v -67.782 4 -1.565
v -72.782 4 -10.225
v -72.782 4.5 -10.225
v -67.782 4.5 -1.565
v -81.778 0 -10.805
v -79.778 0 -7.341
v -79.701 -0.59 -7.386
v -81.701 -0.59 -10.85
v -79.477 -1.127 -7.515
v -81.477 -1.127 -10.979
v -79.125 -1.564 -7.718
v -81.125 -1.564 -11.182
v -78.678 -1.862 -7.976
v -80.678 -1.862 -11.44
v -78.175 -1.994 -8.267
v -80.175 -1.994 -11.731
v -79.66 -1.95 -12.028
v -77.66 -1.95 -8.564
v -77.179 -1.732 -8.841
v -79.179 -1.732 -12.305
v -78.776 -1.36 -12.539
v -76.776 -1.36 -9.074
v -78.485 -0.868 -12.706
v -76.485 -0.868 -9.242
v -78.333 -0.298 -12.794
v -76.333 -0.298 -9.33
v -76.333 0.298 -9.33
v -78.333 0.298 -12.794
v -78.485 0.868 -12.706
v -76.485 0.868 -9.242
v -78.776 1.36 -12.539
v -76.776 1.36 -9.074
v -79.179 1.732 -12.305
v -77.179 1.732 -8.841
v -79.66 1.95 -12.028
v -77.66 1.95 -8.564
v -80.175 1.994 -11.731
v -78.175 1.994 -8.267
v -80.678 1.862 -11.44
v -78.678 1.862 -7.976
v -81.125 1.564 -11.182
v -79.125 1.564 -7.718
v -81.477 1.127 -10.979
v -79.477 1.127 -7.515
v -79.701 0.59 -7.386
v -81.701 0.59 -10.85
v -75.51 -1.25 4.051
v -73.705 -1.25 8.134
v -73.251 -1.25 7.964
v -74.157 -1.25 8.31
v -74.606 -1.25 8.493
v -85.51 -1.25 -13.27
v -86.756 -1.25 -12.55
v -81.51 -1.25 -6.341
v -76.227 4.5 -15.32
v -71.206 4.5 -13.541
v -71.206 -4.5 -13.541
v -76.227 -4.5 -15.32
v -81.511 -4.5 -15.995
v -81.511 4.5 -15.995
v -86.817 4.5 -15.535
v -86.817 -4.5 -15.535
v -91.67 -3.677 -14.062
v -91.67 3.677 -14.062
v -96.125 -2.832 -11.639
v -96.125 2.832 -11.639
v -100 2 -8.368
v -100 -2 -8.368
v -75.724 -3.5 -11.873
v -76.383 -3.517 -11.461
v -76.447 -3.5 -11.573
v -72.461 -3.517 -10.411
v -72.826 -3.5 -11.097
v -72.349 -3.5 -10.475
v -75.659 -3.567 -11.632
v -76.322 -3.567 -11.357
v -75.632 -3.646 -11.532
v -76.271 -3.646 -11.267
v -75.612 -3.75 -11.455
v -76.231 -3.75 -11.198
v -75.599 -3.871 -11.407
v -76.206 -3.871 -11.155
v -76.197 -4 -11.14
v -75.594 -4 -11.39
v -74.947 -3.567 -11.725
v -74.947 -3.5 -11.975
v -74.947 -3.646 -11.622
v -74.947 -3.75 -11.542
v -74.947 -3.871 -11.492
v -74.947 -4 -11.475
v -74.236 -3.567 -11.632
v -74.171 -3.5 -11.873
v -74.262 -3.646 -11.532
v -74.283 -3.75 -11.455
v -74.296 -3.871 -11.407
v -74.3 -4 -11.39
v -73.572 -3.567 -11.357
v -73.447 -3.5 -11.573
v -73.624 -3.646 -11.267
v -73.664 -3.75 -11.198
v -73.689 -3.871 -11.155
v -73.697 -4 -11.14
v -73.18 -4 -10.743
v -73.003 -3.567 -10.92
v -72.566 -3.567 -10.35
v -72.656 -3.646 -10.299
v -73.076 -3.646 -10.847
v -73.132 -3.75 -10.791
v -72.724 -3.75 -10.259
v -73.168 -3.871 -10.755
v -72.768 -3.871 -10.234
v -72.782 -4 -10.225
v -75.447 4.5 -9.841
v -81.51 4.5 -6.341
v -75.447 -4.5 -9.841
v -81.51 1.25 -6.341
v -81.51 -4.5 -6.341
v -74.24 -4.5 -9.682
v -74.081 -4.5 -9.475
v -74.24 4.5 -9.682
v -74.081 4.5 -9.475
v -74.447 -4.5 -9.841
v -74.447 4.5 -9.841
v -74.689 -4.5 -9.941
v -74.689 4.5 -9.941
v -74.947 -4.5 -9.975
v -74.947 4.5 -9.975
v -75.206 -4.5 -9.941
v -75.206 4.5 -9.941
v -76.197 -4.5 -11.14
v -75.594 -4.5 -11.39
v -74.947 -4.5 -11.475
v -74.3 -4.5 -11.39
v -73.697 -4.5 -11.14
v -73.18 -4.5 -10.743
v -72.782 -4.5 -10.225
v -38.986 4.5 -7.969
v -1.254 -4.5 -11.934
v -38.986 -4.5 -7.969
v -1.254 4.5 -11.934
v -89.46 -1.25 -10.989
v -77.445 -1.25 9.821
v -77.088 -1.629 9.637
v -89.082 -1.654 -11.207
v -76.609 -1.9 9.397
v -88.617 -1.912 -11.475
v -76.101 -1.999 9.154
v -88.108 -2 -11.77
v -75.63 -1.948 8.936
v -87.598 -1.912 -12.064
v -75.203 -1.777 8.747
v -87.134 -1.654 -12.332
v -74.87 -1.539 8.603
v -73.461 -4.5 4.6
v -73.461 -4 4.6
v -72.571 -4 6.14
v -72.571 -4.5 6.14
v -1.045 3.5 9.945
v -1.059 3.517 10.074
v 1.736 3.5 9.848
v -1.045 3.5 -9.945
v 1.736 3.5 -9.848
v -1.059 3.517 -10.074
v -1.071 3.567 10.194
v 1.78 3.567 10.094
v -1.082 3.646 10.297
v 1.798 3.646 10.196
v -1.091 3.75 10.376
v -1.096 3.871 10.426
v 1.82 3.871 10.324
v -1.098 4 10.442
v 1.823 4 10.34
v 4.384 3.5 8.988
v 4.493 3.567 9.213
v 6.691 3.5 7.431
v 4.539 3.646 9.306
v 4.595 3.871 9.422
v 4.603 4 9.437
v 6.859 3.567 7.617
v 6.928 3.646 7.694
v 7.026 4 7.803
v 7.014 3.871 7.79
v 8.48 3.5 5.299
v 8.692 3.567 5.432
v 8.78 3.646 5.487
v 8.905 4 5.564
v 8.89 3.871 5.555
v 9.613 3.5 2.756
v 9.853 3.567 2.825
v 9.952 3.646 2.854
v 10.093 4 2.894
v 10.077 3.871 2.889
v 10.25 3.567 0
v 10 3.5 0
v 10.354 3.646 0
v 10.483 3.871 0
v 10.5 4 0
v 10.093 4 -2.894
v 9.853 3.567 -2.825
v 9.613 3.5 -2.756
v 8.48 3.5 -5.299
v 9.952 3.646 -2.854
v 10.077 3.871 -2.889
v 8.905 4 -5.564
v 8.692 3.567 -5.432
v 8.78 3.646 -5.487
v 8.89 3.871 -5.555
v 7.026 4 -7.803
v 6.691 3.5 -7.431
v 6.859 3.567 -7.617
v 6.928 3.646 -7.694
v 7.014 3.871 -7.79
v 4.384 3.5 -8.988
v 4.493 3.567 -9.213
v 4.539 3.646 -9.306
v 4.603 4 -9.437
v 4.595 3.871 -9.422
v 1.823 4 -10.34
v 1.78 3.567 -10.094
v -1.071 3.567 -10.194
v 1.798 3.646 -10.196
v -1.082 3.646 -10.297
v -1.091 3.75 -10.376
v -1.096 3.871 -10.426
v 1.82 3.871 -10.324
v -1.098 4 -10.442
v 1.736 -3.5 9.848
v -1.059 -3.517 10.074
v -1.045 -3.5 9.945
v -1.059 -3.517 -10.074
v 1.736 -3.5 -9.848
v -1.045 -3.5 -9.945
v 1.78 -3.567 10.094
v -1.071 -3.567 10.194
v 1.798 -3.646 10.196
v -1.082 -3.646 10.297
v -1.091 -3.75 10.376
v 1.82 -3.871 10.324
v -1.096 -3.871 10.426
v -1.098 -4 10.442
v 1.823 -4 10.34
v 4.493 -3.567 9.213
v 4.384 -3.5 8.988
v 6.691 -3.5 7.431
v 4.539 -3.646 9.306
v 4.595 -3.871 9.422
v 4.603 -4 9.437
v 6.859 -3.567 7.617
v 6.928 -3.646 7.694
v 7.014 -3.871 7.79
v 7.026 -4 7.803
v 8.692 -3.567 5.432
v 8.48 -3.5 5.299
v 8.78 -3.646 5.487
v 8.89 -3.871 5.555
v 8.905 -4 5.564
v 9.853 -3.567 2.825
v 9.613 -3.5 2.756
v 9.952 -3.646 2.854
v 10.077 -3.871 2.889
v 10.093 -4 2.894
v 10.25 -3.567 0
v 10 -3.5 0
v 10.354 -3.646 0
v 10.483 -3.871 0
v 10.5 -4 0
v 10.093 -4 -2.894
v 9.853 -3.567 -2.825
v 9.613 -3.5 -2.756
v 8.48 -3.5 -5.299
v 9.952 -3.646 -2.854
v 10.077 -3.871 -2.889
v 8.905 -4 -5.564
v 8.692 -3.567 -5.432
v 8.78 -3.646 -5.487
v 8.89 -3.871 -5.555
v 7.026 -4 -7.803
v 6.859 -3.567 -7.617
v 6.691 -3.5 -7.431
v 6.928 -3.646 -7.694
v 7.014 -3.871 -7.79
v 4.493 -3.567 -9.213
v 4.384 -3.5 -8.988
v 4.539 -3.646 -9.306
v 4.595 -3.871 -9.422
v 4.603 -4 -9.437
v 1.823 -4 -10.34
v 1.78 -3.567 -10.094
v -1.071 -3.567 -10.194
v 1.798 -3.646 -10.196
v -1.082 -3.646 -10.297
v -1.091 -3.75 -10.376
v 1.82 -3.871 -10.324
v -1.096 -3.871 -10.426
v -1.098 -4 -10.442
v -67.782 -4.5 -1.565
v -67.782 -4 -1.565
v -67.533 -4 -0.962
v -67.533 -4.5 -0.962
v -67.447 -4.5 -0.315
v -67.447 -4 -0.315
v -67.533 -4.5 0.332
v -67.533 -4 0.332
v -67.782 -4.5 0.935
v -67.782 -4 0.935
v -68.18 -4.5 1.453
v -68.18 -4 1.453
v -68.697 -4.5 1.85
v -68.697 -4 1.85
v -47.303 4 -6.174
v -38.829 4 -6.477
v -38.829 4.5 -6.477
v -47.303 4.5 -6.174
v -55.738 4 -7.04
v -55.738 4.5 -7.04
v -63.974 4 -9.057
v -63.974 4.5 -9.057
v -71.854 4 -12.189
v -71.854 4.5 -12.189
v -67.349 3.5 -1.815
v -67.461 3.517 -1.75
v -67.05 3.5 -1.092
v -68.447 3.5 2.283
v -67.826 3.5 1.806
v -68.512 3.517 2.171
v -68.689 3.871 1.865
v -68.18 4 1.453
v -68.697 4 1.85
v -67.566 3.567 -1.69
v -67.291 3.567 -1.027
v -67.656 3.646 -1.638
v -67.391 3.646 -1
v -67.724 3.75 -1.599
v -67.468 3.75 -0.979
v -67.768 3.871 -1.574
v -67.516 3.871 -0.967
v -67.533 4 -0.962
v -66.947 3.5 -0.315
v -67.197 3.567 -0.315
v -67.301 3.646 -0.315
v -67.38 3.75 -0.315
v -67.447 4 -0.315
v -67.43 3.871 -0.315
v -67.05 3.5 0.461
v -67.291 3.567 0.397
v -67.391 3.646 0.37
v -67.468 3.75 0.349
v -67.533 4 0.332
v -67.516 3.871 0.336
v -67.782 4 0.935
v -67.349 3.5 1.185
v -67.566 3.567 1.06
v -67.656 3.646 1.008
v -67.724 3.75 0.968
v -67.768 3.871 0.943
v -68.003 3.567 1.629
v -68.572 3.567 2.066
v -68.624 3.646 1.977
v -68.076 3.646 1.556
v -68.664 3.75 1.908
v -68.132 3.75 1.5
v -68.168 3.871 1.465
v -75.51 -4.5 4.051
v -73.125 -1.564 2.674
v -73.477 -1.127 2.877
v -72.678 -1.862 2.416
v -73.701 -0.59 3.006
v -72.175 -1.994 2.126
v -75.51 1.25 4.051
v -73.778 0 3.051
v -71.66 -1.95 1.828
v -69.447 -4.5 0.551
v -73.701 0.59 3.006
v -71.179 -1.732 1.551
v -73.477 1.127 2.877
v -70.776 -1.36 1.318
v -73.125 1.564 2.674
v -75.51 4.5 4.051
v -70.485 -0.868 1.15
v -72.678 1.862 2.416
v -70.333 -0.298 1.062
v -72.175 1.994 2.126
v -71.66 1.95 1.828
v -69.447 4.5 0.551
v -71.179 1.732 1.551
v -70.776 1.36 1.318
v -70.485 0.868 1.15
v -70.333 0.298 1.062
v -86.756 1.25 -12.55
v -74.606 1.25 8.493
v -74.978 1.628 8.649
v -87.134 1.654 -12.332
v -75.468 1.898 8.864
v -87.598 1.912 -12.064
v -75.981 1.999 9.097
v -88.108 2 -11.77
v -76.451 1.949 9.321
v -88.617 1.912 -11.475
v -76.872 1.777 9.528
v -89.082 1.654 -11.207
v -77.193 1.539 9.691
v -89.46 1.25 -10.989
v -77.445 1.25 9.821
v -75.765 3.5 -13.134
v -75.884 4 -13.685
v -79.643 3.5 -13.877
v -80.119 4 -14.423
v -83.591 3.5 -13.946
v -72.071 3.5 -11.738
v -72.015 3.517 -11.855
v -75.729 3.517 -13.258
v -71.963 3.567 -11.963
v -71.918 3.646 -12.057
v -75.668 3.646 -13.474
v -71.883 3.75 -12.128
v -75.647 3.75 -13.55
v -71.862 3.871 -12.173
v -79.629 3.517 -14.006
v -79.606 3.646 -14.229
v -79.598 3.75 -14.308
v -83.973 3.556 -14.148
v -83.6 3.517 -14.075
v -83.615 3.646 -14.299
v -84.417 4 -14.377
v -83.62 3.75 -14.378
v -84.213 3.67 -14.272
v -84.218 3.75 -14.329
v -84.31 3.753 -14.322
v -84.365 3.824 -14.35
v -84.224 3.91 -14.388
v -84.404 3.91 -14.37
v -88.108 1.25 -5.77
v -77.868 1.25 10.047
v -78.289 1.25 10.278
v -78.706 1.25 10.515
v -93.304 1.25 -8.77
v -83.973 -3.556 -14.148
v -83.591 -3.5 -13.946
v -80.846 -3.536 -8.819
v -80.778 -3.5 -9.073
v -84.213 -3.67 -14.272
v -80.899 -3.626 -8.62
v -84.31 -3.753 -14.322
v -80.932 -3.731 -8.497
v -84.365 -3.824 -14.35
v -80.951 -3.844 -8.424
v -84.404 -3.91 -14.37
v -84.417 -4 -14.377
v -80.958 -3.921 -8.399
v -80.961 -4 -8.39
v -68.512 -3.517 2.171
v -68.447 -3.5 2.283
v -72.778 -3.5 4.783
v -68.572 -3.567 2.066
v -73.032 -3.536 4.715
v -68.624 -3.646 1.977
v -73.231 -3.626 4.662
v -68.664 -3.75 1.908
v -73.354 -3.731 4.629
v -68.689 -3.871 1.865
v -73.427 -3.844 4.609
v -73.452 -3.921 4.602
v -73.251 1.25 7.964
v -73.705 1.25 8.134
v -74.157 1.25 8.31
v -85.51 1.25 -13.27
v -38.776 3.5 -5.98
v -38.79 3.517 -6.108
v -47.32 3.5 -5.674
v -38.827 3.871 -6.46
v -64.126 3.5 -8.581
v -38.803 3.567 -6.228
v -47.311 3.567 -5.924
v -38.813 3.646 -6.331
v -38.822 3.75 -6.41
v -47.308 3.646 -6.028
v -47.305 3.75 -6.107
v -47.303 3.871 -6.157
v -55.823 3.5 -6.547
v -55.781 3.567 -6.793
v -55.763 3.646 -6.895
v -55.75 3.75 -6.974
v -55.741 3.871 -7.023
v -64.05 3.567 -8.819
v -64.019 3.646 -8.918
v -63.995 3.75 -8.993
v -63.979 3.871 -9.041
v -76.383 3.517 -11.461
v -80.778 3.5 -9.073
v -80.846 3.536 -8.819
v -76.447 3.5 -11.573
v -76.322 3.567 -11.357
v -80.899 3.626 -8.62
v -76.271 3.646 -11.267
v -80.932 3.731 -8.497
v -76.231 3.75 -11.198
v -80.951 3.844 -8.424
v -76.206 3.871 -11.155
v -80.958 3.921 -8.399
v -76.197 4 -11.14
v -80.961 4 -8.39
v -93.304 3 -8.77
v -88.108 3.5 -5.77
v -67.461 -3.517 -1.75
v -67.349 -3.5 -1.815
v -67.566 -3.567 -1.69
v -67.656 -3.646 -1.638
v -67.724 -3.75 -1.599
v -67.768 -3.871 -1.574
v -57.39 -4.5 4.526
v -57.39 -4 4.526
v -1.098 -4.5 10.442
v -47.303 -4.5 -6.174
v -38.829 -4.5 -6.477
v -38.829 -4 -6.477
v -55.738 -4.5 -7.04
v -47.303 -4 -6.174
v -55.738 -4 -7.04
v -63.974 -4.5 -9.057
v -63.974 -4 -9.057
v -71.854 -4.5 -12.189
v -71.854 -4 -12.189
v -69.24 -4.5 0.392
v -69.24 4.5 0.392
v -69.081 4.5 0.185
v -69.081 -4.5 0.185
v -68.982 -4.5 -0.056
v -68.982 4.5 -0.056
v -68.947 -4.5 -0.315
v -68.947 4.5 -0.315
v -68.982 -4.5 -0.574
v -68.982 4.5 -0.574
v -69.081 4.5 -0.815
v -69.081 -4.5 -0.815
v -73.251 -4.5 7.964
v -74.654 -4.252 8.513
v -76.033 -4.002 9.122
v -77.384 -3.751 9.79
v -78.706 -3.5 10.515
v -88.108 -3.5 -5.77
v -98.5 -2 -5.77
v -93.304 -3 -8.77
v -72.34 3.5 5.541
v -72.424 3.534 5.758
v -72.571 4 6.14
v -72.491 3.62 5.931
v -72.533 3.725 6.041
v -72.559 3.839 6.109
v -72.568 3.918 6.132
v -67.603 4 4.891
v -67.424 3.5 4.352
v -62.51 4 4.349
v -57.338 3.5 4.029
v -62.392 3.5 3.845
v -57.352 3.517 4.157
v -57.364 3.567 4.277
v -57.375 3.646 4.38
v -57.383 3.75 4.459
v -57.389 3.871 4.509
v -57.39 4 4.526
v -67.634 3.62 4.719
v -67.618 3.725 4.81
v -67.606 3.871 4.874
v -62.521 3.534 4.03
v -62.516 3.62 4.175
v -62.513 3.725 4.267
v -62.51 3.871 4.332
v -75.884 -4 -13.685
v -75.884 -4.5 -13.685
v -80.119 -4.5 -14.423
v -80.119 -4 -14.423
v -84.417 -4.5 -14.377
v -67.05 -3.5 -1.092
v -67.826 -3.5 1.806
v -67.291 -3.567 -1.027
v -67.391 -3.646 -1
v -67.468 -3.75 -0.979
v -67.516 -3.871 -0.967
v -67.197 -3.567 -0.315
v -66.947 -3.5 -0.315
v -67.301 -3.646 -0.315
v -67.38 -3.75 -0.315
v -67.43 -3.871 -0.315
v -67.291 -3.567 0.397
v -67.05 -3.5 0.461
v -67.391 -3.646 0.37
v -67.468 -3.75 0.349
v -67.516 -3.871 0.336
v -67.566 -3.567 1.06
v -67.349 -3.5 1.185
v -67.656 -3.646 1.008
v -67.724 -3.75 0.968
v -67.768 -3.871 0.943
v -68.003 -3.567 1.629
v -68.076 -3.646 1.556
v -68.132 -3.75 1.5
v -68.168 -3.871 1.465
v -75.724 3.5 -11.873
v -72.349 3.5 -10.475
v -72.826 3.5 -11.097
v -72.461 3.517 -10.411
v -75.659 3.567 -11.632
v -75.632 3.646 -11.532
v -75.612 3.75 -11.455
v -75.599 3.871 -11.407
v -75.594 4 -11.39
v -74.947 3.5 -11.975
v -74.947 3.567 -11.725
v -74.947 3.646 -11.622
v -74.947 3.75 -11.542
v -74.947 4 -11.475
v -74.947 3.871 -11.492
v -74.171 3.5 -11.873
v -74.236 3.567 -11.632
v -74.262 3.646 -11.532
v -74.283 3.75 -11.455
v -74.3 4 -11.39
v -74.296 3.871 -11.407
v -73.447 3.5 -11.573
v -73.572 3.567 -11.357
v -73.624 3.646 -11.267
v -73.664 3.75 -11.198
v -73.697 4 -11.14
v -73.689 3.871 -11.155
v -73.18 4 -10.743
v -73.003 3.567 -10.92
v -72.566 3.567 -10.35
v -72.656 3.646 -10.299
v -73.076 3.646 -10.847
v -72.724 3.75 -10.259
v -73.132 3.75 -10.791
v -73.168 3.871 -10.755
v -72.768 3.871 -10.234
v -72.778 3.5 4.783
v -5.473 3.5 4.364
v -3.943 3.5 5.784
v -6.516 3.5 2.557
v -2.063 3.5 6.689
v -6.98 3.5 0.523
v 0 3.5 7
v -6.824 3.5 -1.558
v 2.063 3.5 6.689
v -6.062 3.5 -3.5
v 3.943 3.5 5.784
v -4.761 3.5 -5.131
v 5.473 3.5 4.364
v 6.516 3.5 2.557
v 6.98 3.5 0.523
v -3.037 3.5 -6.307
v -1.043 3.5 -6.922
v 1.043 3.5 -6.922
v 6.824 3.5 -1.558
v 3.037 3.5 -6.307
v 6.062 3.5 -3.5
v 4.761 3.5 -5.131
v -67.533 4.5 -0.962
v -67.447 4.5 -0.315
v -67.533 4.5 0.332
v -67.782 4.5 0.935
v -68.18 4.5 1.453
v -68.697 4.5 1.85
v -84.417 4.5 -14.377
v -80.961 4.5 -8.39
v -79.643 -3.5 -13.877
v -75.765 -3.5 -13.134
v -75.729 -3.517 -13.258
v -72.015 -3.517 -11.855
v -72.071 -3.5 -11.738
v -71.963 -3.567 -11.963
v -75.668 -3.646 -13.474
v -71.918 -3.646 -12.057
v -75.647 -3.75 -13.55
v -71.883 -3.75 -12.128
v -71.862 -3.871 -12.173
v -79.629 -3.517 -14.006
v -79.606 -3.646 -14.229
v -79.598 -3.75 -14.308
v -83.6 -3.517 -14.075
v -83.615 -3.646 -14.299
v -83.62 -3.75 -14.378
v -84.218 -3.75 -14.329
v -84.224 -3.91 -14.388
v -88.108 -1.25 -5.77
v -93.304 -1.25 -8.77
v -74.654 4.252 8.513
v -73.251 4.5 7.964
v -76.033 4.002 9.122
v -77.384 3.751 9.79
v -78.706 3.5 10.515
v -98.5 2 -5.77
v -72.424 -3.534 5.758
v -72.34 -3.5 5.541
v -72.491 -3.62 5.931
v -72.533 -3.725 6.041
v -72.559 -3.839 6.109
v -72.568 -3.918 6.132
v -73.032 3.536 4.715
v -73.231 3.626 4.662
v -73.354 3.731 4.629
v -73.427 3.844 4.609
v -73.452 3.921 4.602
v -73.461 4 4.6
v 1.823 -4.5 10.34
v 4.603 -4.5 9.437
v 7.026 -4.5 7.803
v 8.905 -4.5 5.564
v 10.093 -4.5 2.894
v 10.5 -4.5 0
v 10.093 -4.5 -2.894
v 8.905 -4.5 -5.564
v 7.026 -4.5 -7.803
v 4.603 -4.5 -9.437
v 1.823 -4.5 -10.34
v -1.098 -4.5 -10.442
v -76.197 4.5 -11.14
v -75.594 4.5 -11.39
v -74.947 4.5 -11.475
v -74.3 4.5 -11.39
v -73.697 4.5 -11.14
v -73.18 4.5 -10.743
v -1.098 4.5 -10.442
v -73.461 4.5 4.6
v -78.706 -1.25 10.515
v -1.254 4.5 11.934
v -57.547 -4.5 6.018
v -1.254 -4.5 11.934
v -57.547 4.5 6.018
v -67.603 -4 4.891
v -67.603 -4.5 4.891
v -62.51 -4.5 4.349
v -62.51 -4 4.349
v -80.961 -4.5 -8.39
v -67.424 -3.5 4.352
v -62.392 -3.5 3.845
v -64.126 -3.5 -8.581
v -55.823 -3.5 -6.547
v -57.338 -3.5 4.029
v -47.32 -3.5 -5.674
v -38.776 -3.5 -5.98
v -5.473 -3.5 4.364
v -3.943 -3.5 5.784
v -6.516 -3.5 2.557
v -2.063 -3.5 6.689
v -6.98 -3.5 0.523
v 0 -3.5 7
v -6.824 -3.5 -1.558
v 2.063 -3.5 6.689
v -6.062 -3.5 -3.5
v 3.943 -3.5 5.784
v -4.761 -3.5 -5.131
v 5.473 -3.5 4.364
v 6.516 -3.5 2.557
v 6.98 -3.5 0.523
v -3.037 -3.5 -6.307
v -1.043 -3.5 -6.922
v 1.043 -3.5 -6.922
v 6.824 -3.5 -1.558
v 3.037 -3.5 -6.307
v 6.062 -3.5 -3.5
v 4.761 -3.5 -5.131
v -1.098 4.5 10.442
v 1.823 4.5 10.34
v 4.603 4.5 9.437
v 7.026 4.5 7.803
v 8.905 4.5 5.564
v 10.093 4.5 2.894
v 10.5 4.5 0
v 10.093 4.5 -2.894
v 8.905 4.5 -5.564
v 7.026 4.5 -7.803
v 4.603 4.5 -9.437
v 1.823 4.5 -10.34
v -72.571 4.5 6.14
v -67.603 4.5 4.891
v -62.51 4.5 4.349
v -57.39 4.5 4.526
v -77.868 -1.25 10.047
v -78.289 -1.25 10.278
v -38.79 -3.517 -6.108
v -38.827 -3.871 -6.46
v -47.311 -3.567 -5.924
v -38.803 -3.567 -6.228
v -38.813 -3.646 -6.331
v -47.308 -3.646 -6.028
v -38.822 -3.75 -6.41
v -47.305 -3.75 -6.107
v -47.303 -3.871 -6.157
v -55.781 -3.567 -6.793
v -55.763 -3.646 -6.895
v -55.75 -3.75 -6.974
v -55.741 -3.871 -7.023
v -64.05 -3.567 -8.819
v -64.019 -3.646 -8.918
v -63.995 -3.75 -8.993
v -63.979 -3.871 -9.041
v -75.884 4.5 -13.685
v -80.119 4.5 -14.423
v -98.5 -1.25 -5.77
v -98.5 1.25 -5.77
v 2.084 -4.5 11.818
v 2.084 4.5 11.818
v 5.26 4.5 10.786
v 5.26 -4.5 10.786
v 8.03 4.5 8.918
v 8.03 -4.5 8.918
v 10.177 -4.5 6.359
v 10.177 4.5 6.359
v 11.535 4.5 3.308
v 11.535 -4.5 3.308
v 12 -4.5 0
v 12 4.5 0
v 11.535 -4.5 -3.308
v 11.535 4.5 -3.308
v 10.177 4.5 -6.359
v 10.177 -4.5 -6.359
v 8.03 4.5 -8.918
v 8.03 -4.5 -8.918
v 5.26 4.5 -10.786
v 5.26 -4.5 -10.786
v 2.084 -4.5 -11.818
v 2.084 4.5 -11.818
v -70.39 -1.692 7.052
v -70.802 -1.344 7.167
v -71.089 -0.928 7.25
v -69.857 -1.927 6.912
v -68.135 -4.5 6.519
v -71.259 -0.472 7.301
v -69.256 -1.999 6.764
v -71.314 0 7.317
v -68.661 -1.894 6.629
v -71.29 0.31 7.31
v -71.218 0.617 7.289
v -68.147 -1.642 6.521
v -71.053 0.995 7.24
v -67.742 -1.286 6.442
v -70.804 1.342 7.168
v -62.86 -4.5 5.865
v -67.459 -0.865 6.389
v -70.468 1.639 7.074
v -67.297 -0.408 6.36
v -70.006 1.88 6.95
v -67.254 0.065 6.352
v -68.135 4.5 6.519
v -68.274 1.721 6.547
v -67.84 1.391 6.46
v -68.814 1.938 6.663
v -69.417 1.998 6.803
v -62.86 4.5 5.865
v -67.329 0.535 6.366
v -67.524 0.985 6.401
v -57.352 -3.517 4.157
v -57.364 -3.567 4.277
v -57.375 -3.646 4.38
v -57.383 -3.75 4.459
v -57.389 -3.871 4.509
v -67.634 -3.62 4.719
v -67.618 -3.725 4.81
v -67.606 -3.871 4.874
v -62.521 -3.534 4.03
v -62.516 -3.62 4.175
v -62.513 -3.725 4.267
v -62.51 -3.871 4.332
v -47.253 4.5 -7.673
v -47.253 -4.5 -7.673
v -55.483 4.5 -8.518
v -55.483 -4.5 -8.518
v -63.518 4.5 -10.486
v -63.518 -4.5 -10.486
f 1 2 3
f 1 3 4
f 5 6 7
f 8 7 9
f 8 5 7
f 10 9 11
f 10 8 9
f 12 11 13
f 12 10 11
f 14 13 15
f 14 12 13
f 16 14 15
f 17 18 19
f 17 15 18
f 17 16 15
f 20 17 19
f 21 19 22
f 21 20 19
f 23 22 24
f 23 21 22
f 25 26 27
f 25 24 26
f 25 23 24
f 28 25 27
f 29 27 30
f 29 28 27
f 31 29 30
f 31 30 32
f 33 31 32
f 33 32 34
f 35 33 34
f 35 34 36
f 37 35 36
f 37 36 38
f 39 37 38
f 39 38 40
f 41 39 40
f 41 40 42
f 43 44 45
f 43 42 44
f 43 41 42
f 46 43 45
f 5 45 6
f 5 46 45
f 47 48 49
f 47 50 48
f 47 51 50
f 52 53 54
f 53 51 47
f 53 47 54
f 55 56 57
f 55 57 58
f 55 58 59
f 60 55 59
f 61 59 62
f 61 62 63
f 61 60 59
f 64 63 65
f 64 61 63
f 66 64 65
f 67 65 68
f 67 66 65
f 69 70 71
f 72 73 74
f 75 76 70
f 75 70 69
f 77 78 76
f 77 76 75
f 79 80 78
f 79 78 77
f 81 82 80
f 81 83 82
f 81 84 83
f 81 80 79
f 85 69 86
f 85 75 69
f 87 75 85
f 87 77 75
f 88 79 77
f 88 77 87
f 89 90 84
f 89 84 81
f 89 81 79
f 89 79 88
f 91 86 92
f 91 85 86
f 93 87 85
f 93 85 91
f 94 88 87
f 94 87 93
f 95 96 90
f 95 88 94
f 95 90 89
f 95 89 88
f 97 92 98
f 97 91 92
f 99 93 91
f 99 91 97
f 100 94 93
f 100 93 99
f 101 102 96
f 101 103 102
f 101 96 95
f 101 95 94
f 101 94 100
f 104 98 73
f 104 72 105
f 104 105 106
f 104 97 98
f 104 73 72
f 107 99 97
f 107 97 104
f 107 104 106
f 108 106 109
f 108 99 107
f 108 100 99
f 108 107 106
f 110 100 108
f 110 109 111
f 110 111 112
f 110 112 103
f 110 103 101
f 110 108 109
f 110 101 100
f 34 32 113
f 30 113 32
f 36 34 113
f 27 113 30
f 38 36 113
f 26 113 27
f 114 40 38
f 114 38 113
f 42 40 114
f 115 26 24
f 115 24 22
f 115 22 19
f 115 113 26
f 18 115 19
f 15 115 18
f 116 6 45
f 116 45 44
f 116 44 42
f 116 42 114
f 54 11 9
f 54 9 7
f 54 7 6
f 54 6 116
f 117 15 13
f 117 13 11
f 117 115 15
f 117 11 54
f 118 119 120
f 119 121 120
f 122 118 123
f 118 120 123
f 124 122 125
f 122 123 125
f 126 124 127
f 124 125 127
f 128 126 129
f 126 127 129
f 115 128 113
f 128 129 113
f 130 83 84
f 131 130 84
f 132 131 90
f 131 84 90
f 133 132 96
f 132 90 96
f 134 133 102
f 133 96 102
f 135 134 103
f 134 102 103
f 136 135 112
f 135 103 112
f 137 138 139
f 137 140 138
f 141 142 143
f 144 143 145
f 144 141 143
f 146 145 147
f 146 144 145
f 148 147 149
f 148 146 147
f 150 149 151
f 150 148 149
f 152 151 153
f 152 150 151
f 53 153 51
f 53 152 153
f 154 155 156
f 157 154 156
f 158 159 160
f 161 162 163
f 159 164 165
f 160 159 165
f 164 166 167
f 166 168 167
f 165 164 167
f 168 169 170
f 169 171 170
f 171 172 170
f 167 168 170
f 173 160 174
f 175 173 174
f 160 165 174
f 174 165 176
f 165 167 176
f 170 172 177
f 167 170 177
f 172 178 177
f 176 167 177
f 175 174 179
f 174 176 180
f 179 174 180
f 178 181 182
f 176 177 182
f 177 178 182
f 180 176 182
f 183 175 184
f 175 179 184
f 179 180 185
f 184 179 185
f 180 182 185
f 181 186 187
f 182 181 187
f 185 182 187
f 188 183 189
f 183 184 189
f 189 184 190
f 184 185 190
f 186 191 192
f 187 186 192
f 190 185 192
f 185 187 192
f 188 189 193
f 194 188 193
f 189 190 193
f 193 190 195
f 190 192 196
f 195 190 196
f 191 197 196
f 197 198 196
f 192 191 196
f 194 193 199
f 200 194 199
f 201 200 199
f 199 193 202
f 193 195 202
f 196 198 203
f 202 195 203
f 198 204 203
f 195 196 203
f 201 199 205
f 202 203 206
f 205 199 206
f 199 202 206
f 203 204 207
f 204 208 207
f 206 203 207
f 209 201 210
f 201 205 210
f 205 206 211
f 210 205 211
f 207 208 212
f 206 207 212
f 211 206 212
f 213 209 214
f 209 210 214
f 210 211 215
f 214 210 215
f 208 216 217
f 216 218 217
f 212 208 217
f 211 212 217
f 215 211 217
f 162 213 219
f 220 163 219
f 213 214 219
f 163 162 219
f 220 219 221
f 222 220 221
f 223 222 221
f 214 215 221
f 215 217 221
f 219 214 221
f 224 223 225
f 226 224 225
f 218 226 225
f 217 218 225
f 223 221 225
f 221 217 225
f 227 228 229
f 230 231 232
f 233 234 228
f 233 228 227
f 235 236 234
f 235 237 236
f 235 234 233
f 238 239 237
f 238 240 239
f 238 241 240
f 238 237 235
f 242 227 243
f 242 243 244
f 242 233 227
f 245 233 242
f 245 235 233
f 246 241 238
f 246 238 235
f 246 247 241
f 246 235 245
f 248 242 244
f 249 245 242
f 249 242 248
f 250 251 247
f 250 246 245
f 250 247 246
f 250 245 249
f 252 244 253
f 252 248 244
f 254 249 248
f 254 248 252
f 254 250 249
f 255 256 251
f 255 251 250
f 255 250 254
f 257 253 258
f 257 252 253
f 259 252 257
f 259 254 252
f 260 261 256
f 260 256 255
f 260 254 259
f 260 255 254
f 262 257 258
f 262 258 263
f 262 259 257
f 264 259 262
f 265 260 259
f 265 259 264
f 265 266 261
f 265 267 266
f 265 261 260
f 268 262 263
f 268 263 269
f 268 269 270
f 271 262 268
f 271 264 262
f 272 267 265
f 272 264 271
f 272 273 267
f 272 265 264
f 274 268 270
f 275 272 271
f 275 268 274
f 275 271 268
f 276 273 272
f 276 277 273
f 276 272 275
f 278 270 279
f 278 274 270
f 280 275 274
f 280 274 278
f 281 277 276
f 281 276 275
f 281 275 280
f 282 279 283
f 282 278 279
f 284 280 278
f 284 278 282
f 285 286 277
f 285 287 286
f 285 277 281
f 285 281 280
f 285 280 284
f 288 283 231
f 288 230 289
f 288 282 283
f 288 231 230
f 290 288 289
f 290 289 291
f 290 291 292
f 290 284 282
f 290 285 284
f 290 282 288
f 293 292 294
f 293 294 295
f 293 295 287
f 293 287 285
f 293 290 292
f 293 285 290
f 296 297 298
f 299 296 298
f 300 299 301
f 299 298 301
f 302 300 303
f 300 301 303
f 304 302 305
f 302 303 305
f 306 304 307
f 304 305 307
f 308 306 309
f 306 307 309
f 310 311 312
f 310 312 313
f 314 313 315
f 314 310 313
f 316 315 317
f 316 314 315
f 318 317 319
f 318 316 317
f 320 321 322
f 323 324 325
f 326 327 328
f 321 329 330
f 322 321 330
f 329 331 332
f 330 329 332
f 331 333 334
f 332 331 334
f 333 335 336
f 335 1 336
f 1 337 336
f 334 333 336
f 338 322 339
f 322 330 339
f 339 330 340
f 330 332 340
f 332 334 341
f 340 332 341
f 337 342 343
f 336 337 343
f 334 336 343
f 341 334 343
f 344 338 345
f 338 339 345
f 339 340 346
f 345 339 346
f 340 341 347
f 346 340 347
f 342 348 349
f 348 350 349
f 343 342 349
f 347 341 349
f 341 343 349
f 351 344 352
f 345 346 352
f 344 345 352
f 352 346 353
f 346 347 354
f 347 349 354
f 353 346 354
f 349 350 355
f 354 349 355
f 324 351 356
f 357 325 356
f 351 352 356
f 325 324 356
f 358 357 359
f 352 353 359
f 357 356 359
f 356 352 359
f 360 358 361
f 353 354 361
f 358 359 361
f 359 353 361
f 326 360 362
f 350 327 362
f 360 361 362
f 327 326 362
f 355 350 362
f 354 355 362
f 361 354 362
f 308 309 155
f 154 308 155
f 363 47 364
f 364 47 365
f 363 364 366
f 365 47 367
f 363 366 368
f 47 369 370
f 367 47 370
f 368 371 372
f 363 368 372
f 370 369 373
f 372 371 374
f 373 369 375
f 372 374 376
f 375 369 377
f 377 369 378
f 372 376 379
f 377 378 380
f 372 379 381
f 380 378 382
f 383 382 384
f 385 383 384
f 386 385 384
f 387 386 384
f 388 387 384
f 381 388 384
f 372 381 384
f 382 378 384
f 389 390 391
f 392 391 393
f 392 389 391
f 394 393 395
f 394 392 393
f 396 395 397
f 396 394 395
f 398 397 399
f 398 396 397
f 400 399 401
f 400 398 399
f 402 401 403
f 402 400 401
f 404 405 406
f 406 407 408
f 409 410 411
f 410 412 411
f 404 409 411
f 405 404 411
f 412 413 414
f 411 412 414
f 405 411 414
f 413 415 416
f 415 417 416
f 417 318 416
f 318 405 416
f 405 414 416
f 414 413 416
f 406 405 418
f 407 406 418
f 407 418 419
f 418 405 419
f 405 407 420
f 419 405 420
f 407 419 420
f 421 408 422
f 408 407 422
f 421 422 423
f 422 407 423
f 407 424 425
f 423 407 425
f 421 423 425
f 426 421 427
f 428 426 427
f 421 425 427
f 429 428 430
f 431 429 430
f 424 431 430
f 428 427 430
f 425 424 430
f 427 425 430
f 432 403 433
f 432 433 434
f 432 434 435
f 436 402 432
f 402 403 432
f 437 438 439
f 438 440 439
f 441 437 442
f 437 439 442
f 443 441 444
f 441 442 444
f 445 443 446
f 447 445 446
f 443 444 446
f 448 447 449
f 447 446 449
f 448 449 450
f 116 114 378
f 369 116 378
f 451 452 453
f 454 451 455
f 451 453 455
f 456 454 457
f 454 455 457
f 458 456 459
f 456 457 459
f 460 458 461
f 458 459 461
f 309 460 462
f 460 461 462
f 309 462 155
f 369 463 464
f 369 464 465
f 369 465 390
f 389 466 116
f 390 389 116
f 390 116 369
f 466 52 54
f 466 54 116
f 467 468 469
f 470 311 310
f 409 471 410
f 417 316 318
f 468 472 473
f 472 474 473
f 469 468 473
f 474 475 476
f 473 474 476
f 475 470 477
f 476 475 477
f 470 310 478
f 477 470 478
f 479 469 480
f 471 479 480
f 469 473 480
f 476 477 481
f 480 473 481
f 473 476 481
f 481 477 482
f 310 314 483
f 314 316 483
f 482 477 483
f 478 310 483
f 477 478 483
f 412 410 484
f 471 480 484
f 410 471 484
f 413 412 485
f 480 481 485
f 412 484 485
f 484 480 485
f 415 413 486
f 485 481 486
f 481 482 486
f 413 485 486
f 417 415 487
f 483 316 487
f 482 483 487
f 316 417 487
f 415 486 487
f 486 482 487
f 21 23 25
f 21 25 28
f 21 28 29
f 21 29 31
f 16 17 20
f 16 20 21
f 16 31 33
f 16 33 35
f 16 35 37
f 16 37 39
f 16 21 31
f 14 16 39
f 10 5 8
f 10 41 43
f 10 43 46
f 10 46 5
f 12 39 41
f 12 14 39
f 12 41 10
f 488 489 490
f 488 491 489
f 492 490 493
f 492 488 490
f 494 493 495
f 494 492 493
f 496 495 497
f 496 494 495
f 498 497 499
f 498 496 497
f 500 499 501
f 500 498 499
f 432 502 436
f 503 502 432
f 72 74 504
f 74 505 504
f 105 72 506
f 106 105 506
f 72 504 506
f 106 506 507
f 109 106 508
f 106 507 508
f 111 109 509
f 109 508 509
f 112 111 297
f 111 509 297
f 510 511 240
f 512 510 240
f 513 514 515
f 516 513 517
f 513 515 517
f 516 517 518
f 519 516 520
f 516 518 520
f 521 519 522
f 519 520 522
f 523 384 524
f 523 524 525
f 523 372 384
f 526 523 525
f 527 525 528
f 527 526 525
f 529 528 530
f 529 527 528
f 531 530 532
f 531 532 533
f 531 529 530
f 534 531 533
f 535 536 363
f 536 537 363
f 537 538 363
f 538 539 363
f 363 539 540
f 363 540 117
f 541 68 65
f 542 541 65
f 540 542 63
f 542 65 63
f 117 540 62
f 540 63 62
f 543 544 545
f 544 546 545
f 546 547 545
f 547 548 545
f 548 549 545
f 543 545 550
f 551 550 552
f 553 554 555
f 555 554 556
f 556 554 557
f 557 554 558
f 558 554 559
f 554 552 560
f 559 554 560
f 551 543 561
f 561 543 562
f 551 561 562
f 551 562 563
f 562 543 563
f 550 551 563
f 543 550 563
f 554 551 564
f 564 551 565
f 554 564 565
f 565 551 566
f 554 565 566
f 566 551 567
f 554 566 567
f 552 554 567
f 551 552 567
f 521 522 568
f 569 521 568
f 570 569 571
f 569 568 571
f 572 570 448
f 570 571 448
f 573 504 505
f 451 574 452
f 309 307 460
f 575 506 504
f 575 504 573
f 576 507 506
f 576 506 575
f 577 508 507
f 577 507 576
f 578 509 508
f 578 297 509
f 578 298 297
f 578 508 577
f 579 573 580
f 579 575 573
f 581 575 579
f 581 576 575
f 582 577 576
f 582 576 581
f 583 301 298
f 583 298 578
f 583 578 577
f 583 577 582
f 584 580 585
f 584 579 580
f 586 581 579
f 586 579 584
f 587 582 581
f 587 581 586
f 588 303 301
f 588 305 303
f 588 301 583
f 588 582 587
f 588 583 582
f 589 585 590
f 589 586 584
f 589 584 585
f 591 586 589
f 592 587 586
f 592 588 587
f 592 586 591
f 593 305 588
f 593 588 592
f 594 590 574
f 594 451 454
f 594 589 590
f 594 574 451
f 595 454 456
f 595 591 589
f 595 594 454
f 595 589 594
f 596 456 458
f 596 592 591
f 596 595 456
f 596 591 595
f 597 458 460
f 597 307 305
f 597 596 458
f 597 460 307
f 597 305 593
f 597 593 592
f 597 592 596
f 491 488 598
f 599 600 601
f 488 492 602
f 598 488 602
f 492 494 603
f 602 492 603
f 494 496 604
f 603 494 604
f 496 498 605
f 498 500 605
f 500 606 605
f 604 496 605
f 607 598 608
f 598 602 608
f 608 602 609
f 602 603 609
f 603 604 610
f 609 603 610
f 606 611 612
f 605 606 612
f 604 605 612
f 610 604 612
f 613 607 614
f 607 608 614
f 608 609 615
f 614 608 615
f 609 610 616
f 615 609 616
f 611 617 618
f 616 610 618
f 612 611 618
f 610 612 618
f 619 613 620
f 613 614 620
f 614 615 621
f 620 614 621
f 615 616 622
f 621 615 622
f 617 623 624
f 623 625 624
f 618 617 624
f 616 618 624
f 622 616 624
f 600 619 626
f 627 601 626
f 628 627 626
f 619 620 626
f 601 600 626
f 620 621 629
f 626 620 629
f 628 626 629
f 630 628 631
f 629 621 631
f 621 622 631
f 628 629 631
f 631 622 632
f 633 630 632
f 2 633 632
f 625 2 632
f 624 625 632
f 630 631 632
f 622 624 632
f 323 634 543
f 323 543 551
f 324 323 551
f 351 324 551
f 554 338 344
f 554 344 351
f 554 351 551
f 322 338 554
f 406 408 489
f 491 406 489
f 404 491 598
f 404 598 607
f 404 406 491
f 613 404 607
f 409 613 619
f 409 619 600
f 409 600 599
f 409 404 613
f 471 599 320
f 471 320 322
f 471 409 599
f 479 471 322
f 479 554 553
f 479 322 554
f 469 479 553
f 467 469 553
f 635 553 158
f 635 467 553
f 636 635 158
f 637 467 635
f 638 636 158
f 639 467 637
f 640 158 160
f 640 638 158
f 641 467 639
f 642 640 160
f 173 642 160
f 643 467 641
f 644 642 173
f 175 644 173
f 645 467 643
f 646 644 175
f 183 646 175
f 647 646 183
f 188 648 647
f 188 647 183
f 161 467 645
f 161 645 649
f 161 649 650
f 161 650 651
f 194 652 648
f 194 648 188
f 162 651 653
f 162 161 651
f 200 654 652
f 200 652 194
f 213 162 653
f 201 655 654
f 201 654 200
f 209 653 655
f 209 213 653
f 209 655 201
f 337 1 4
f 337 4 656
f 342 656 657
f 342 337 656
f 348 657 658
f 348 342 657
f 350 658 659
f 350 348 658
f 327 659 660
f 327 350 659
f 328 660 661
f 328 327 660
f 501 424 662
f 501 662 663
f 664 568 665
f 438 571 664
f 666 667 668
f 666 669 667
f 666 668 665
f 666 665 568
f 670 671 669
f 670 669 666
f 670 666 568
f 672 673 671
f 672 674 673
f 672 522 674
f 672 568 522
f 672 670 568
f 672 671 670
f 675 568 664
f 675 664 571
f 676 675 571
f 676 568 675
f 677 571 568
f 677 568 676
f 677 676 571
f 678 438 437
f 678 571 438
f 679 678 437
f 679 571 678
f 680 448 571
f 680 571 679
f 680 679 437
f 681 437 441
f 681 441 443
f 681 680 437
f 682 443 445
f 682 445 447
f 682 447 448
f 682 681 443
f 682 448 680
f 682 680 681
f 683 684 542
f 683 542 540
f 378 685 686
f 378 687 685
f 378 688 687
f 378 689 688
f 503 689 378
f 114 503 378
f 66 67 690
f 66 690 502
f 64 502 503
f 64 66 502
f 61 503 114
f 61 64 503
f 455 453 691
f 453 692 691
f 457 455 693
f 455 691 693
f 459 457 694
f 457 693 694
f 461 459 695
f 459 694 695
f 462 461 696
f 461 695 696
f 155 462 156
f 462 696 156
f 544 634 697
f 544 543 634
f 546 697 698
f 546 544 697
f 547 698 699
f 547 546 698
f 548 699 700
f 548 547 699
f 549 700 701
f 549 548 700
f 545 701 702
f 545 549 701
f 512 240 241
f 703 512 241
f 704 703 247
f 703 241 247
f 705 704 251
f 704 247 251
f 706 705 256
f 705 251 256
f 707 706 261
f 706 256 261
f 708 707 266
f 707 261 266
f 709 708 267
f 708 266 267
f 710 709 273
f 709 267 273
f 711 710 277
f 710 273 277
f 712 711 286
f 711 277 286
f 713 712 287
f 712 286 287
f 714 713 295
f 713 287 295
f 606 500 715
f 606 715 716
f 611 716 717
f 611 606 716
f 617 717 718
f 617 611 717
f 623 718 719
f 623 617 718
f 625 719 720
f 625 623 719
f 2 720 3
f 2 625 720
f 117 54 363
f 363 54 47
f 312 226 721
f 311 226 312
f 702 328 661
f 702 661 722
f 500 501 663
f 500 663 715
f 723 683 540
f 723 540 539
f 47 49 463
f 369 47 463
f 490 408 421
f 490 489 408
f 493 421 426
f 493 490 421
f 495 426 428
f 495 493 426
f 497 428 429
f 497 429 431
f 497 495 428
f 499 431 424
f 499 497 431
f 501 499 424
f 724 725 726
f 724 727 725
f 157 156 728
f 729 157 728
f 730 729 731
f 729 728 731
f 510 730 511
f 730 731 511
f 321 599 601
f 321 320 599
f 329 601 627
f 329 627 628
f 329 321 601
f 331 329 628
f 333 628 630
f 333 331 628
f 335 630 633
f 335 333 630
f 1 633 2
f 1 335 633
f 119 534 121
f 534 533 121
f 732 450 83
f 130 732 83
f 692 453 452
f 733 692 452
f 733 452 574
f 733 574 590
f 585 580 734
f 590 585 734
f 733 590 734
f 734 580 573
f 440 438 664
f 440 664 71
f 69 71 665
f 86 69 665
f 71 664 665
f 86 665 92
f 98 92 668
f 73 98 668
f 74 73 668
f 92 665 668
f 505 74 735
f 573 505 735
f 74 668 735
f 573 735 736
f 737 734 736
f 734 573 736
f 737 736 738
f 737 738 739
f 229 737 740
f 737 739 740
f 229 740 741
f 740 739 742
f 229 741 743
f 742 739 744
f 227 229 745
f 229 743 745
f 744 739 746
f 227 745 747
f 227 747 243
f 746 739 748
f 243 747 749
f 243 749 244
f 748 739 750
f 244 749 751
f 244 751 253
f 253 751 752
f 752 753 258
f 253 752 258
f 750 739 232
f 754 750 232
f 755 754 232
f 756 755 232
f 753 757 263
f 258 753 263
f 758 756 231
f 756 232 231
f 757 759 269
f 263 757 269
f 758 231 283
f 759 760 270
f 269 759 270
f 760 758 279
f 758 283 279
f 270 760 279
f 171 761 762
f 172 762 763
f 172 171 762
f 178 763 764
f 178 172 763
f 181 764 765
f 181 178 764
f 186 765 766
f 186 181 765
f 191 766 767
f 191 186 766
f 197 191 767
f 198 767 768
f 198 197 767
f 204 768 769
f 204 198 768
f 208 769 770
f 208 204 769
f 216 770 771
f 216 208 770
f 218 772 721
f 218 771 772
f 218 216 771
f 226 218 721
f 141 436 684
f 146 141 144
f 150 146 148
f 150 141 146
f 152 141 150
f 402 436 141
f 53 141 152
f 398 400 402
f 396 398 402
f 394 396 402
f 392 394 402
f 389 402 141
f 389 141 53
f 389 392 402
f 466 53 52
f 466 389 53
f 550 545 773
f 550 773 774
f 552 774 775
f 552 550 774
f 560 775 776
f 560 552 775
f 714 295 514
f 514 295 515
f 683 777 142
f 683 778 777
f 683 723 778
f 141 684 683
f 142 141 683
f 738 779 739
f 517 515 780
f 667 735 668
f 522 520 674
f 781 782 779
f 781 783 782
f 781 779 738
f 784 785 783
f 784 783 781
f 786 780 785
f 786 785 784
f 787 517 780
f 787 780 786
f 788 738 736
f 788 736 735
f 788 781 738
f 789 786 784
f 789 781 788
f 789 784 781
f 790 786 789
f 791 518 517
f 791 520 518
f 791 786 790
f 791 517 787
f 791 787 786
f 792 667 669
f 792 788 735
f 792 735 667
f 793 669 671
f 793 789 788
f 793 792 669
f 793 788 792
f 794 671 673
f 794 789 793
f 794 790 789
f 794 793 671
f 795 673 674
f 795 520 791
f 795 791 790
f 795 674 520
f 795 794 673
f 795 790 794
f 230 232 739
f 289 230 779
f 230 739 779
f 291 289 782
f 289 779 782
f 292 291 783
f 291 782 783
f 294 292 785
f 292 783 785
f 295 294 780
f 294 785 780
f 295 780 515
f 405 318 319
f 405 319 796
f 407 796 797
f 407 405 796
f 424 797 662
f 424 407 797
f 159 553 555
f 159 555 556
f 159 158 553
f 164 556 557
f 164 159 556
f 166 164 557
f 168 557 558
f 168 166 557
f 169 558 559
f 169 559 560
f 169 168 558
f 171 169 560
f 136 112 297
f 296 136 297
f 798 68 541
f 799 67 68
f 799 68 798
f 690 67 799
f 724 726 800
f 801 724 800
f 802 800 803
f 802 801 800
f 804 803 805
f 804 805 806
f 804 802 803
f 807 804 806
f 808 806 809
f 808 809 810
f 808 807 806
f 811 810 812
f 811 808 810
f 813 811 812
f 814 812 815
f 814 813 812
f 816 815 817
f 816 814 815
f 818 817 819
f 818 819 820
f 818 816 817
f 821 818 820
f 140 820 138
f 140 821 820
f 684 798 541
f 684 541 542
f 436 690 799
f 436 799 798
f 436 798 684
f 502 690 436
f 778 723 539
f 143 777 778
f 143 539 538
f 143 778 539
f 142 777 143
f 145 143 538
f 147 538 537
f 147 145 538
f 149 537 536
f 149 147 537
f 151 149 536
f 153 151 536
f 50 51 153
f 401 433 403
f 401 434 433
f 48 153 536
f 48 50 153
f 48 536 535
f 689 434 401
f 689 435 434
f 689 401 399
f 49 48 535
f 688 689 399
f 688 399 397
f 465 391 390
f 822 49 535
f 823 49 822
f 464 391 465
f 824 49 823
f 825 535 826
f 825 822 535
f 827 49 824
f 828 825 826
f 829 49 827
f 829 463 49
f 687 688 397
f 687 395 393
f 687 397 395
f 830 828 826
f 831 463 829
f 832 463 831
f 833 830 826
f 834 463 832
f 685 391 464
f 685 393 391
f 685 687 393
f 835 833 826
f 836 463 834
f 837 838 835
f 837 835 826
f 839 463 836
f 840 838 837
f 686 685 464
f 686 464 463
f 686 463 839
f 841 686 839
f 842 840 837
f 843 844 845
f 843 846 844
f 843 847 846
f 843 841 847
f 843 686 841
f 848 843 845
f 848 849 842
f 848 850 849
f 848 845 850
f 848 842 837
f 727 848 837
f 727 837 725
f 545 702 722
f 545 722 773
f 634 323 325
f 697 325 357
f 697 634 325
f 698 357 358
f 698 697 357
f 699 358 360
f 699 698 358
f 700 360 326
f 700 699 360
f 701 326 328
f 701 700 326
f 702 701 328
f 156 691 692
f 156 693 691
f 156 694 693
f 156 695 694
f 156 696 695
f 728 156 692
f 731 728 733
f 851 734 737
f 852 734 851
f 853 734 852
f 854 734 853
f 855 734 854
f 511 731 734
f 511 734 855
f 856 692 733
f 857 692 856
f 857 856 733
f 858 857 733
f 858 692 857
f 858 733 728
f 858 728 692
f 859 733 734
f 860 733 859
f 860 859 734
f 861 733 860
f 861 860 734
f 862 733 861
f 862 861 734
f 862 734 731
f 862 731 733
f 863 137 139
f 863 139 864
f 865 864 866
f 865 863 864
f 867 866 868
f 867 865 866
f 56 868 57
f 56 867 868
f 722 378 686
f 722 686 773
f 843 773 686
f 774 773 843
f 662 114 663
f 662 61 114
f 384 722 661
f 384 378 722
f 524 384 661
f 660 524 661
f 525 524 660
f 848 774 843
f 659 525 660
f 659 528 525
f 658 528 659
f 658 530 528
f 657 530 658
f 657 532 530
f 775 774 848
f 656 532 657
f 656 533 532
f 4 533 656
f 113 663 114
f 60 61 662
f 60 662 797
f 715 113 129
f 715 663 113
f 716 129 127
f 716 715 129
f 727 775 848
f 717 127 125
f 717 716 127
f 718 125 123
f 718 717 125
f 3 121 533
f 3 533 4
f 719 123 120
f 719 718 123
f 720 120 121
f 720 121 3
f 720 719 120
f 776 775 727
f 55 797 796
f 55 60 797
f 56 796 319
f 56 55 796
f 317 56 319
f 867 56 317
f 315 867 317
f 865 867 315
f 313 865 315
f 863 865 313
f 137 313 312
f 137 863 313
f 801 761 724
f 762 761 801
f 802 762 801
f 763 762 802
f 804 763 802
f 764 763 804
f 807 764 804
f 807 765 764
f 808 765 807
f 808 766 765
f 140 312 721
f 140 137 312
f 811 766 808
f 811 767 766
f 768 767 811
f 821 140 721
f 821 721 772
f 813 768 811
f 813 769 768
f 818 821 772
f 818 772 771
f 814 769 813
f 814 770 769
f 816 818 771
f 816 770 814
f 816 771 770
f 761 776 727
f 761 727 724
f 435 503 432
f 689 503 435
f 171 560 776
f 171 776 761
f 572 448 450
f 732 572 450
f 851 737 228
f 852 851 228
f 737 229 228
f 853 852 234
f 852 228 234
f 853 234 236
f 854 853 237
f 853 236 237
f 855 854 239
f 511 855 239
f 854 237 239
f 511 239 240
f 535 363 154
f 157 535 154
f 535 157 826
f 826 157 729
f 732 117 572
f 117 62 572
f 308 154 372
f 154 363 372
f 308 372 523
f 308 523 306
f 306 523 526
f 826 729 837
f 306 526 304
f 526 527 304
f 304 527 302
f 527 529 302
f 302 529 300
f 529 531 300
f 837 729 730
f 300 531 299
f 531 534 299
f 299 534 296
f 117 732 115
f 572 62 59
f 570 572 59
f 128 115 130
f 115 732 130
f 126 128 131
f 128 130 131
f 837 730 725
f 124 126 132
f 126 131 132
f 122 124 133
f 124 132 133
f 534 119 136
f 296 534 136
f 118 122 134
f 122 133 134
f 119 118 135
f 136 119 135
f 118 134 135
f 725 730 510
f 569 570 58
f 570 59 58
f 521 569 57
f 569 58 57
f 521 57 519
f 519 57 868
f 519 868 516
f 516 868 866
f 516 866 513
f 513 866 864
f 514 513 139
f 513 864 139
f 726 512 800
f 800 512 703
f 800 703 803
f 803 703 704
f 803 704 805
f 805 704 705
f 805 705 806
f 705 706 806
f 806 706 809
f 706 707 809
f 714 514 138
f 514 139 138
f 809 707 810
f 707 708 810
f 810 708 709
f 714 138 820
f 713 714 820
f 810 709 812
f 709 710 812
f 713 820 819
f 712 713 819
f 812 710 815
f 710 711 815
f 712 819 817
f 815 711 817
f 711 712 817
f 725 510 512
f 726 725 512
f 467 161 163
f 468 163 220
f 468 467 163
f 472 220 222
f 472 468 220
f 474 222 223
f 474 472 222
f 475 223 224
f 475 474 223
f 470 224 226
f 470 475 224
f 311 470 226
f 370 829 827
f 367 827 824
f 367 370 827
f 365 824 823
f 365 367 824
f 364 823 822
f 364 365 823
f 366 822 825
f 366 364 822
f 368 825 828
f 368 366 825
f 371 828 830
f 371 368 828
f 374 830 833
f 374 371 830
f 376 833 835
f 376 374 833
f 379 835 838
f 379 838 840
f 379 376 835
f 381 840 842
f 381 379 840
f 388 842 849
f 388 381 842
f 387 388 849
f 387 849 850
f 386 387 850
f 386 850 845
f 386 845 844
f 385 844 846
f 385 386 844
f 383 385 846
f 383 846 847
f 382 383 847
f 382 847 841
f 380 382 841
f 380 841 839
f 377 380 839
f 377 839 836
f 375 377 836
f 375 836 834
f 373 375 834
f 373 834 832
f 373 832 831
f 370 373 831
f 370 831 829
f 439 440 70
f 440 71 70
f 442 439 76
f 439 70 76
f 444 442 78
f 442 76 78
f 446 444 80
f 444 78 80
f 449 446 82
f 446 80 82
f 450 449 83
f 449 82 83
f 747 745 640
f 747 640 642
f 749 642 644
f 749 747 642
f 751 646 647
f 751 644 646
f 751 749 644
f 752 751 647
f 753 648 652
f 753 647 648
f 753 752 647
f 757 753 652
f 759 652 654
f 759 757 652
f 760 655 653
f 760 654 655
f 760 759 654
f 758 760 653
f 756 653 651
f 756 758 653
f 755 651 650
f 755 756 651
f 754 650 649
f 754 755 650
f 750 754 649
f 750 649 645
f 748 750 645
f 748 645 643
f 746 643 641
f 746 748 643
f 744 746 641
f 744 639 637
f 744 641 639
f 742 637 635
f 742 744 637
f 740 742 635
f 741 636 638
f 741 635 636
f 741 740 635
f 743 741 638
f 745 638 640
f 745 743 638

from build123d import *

# Parameters (mm, degrees)
SKETCH1_R               = 7
BOSS_EXTRUDE1_DEPTH     = 4.5
CUT_EXTRUDE1_DEPTH      = 93.949210636
CUT_EXTRUDE1_DEPTH_BACK = 4
SKETCH2_R               = 2
CUT_EXTRUDE2_DEPTH      = 94.860420286
CUT_EXTRUDE3_DEPTH      = 94.860420286
CUT_EXTRUDE3_DEPTH_BACK = 94.860420286
FILLET1_R               = 1
CUT_EXTRUDE4_START      = -1
CUT_EXTRUDE4_DEPTH      = 103.671038166
FILLET2_R               = 0.5
FILLET2_OF_MIRROR1_R    = 0.5


with BuildPart() as part:
    # Sketch1 → Boss-Extrude1 (new, symmetric)
    with BuildSketch(Plane(origin=(0, 0, 0), x_dir=(1, 0, 0), z_dir=(0, 1, 0))):
        with BuildLine():
            Line((-1.254341559, 11.934262744), (-38.985522111, 7.968555867))
            ThreePointArc((-38.985522111, 7.968555867), (-55.482588048, 8.517606008), (-71.205780018, 13.541138114))
            ThreePointArc((-71.205780018, 13.541138114), (-86.438642867, 15.605996242), (-100, 8.367671688))
            Line((-100, 8.367671688), (-98.5, 5.769595477))
            Line((-98.5, 5.769595477), (-93.303847577, 8.769595477))
            Line((-93.303847577, 8.769595477), (-88.107695155, 5.769595477))
            Line((-88.107695155, 5.769595477), (-78.705771366, -10.515014214))
            ThreePointArc((-78.705771366, -10.515014214), (-68.482680545, -6.590737321), (-57.547275152, -6.017637008))
            Line((-57.547275152, -6.017637008), (-1.254341559, -11.934262744))
            ThreePointArc((-1.254341559, -11.934262744), (12, 0), (-1.254341559, 11.934262744))
        make_face()
        with Locations(Location((0, 0, 0), (0, 0, 270))):
            Circle(SKETCH1_R, mode=Mode.SUBTRACT)
        Polygon((-81.509618943, 6.341392247), (-75.509618943, -4.050912599), (-68.581415713, -0.050912599), (-74.581415713, 10.341392247), align=None, mode=Mode.SUBTRACT)
    extrude(amount=BOSS_EXTRUDE1_DEPTH, both=True)

    # Sketch2 → Cut-Extrude1 (cut, two sides: drawn at the far end of the back side and taken through both)
    with BuildSketch(Plane(origin=(-23.123308126, 0, -40.050744514), x_dir=(0.86602540378444, 0, -0.49999999999999784), z_dir=(0.49999999999999784, 0, 0.86602540378444)).offset(-CUT_EXTRUDE1_DEPTH_BACK)):
        with Locations(Location((-63.418704534, 0, 0), (0, 0, 180))):
            Circle(SKETCH2_R)
    extrude(amount=CUT_EXTRUDE1_DEPTH + CUT_EXTRUDE1_DEPTH_BACK, mode=Mode.SUBTRACT)

    # Sketch3 → Cut-Extrude2 (cut, through all)
    with BuildSketch(Plane(origin=(-27.123308126, 0, -46.978947744), x_dir=(0.8660254037844406, 0, -0.4999999999999967), z_dir=(0.4999999999999967, 0, 0.8660254037844406))):
        with BuildLine():
            Line((-82.418704534, -1.25), (-71.979954034, -1.25))
            ThreePointArc((-71.979954034, -1.25), (-70.418704534, -2), (-68.857455035, -1.25))
            Line((-68.857455035, -1.25), (-67.418704534, -1.25))
            Line((-67.418704534, -1.25), (-67.418704534, 1.25))
            Line((-67.418704534, 1.25), (-68.857455035, 1.25))
            ThreePointArc((-68.857455035, 1.25), (-70.418704534, 2), (-71.979954034, 1.25))
            Line((-71.979954034, 1.25), (-82.418704534, 1.25))
            Line((-82.418704534, 1.25), (-82.418704534, -1.25))
        make_face()
    extrude(amount=CUT_EXTRUDE2_DEPTH, mode=Mode.SUBTRACT)

    # Sketch4 → Cut-Extrude3 (cut, two sides: drawn at the far end of the back side and taken through both)
    with BuildSketch(Plane(origin=(-27.123308126, 0, -46.978947744), x_dir=(0.8660254037844406, 0, -0.4999999999999967), z_dir=(0.4999999999999967, 0, 0.8660254037844406)).offset(-CUT_EXTRUDE3_DEPTH_BACK)):
        Polygon((-82.418704534, 4.5), (-82.418704534, 2), (-67.418704534, 4.5), align=None)
        Polygon((-82.418704534, -4.5), (-82.418704534, -2), (-67.418704534, -4.5), align=None)
    extrude(amount=CUT_EXTRUDE3_DEPTH + CUT_EXTRUDE3_DEPTH_BACK, mode=Mode.SUBTRACT)

    # Fillet1
    fillet1_edges = [part.edges().sort_by_distance(p)[0] for p in [
        (-74.581415713, 0, -10.341392247),
        (-68.581415713, 0, 0.050912599),
    ]]
    fillet(fillet1_edges, radius=FILLET1_R)

    # Sketch5 → Cut-Extrude4 (cut)
    with BuildSketch(Plane(origin=(0, 4.5, 0), x_dir=(1, 0, 0), z_dir=(0, 1, 0)).offset(CUT_EXTRUDE4_START)):
        with BuildLine():
            Line((-84.417038698, 14.377190981), (-80.960580838, 8.390430352))
            Line((-80.960580838, 8.390430352), (-76.197441117, 11.140430352))
            ThreePointArc((-76.197441117, 11.140430352), (-74.300393504, 11.390181409), (-72.782377607, 10.225366843))
            Line((-72.782377607, 10.225366843), (-67.782377607, 1.565112805))
            ThreePointArc((-67.782377607, 1.565112805), (-67.532626551, -0.331934808), (-68.697441117, -1.849950704))
            Line((-68.697441117, -1.849950704), (-73.460580838, -4.599950704))
            Line((-73.460580838, -4.599950704), (-72.571151937, -6.14048675))
            ThreePointArc((-72.571151937, -6.14048675), (-65.066176866, -4.530624461), (-57.390482457, -4.525854165))
            Line((-57.390482457, -4.525854165), (-1.097548864, -10.442479901))
            ThreePointArc((-1.097548864, -10.442479901), (10.5, 0), (-1.097548864, 10.442479901))
            Line((-1.097548864, 10.442479901), (-38.828729416, 6.476773024))
            ThreePointArc((-38.828729416, 6.476773024), (-55.738222001, 7.039549419), (-71.854493771, 12.188669828))
            ThreePointArc((-71.854493771, 12.188669828), (-77.984484997, 14.151314674), (-84.417038698, 14.377190981))
        make_face()
    cut_extrude4 = extrude(amount=CUT_EXTRUDE4_DEPTH, mode=Mode.SUBTRACT)

    # Fillet2
    fillet2_edges = [part.edges().sort_by_distance(p)[0] for p in [
        (-78.579010977, 3.5, -9.765430352),
        (-74.300393504, 3.5, -11.390181409),
        (-71.079010977, 3.5, 3.224950704),
        (-67.532626551, 3.5, 0.331934808),
        (-65.066176866, 3.5, 4.530624461),
        (-29.24401566, 3.5, 7.484167033),
        (10.5, 3.5, 0),
        (-19.96313914, 3.5, -8.459626463),
        (-55.738222001, 3.5, -7.039549419),
        (-73.015866387, 3.5, 5.370218727),
        (-70.282377607, 3.5, -5.895239824),
        (-82.688809768, 3.5, -11.383810667),
        (-77.984484997, 3.5, -14.151314674),
    ]]
    fillet(fillet2_edges, radius=FILLET2_R)

    # Mirror1: Cut-Extrude4 across plane
    add(cut_extrude4.mirror(Plane.ZX), mode=Mode.SUBTRACT)

    # Fillet2 of Mirror1
    fillet2_of_mirror1_edges = [part.edges().sort_by_distance(p)[0] for p in [
        (-78.579010977, -3.5, -9.765430352),
        (-74.300393504, -3.5, -11.390181409),
        (-71.079010977, -3.5, 3.224950704),
        (-67.532626551, -3.5, 0.331934808),
        (-65.066176866, -3.5, 4.530624461),
        (-29.24401566, -3.5, 7.484167033),
        (10.5, -3.5, 0),
        (-19.96313914, -3.5, -8.459626463),
        (-55.738222001, -3.5, -7.039549419),
        (-73.015866387, -3.5, 5.370218727),
        (-70.282377607, -3.5, -5.895239824),
        (-82.688809768, -3.5, -11.383810667),
        (-77.984484997, -3.5, -14.151314674),
    ]]
    fillet(fillet2_of_mirror1_edges, radius=FILLET2_OF_MIRROR1_R)


solid = part.part
